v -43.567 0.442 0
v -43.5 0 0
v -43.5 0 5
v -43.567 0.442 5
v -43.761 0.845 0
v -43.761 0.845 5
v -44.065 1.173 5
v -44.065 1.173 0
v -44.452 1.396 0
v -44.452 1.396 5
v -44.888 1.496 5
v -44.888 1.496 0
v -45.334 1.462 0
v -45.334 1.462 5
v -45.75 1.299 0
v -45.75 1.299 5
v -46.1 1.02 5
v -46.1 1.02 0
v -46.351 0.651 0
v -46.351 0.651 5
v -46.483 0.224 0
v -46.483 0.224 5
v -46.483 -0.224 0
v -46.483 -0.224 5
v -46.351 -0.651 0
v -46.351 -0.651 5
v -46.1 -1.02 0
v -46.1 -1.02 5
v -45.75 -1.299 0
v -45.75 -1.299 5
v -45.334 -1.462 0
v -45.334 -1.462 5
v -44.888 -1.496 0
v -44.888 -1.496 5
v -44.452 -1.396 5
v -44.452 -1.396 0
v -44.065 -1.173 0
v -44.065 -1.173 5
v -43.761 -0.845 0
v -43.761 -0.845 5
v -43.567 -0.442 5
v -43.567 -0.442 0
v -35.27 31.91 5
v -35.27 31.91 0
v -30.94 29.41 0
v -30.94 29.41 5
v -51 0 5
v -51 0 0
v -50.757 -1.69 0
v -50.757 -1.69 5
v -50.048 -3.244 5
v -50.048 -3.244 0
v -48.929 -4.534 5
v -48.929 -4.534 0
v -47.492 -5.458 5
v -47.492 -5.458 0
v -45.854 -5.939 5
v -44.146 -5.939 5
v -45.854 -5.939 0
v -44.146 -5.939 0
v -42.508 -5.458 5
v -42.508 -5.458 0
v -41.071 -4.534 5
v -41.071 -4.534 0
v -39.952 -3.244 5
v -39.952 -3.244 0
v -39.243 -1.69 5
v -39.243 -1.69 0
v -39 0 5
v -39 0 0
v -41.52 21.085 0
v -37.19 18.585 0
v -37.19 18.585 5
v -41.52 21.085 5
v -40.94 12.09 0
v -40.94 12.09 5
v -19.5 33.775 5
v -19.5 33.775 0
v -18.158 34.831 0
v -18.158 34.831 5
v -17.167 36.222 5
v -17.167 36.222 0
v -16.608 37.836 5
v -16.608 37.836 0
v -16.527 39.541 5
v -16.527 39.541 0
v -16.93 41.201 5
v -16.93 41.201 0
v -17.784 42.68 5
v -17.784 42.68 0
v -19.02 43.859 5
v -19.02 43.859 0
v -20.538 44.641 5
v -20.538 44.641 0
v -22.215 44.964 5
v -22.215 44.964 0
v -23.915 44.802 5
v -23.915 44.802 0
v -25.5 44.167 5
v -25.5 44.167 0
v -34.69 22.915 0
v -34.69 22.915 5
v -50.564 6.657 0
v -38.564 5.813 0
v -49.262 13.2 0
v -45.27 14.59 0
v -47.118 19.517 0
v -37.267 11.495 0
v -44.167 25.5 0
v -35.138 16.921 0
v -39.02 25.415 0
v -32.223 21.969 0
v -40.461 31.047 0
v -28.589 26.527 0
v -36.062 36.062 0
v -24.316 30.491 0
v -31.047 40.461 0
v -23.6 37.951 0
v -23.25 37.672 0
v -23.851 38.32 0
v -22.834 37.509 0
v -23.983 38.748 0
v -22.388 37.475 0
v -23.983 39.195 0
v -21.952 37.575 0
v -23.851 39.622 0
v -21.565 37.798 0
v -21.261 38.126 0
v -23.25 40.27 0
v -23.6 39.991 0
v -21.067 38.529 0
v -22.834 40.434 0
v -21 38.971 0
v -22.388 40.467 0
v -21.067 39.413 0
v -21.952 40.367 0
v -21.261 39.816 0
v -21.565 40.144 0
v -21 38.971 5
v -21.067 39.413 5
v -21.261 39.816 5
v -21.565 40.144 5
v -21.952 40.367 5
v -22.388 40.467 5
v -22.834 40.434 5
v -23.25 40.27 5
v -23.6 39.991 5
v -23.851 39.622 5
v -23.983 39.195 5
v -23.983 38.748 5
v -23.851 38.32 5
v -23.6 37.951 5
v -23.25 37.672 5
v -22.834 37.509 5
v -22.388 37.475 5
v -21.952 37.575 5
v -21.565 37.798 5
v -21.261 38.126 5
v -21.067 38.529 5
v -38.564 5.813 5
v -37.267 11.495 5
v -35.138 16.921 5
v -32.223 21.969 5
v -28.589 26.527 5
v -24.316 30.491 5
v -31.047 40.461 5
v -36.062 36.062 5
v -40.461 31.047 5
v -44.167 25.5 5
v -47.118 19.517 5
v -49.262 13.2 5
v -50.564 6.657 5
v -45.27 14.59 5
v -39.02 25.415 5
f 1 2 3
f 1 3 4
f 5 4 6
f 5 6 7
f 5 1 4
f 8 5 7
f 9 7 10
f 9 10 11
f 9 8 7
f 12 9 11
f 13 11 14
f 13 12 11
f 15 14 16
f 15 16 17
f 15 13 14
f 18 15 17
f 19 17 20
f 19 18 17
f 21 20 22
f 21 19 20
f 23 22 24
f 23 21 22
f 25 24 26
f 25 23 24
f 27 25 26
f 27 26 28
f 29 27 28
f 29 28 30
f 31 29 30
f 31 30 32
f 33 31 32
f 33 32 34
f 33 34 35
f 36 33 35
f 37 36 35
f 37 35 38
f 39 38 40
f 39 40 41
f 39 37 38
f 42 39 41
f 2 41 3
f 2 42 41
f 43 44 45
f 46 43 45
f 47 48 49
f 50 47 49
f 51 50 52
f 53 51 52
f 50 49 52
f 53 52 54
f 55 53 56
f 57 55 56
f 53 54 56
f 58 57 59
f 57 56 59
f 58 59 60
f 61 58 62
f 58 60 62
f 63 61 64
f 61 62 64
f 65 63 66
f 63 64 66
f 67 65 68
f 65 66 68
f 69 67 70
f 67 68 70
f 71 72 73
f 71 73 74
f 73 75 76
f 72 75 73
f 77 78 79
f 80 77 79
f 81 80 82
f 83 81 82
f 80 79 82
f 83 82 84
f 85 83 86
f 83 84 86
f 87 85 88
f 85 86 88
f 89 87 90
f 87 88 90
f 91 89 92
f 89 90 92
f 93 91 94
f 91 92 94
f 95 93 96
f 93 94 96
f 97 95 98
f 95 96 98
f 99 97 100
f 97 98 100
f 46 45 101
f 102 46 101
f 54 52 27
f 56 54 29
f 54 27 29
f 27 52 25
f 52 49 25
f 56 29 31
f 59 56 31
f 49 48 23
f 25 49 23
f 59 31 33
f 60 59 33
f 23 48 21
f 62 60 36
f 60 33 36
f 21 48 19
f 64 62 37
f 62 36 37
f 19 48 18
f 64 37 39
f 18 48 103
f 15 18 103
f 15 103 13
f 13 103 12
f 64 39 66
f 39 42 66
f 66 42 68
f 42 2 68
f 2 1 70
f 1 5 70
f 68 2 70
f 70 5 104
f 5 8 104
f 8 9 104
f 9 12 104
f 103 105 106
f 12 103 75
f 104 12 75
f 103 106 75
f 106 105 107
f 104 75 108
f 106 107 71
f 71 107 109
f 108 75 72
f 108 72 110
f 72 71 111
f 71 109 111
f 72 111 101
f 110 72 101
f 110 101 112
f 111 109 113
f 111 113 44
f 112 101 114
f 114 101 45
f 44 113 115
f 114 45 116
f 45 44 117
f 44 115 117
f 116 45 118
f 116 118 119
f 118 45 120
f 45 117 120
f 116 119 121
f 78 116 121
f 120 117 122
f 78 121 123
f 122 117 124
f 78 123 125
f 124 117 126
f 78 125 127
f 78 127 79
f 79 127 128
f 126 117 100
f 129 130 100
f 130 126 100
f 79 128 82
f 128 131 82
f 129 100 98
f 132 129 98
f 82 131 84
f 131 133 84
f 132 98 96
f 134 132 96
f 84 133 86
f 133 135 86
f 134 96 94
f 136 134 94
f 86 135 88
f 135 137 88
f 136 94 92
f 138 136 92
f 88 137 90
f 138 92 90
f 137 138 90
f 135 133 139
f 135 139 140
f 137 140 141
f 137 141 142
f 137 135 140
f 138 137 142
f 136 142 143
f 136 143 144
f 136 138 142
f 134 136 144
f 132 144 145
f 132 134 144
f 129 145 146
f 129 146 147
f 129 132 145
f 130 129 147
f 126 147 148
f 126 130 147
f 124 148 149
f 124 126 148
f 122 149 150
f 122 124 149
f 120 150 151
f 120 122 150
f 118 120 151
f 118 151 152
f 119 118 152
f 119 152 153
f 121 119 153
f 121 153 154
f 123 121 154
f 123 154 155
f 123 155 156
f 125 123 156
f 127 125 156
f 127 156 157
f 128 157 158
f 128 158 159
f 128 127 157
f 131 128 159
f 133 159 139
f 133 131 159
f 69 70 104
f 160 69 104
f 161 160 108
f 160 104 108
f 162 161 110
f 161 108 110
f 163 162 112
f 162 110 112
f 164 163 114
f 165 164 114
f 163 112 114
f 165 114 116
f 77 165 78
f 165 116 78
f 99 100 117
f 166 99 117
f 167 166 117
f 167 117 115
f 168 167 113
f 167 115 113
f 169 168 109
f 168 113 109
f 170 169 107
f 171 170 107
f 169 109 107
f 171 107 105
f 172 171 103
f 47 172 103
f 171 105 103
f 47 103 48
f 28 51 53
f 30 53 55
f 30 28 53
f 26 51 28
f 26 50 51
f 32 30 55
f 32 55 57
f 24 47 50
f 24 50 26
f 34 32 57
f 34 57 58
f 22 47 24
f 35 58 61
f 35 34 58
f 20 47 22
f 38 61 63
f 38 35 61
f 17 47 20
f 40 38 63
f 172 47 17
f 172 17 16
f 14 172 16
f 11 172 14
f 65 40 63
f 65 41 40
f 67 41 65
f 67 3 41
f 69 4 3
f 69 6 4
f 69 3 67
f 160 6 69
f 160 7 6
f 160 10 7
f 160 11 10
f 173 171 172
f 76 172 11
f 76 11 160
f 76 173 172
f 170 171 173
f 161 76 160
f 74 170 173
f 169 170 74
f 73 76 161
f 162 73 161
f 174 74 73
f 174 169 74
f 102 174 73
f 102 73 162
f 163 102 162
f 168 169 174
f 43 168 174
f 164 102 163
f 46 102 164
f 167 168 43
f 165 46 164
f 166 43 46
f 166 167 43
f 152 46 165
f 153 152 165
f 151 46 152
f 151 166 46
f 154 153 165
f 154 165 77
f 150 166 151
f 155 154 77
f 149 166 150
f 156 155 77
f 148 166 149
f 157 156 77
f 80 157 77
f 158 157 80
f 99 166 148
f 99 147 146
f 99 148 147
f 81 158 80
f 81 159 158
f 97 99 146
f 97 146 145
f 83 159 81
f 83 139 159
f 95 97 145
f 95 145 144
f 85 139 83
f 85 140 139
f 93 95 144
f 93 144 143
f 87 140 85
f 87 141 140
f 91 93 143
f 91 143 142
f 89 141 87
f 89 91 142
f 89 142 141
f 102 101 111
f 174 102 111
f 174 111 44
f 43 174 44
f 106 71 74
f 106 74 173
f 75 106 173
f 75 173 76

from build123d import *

# Parameters (mm, degrees)
ESQUISSE1_R        = 1.5
BOSS_EXTRU_1_DEPTH = 5


with BuildPart() as part:
    # Esquisse1 → Boss.-Extru.1 (new body)
    with BuildSketch(Plane.XY):
        with BuildLine():
            ThreePointArc((-25.5, 44.167295593), (-44.167295593, 25.5), (-51, 0))
            ThreePointArc((-51, 0), (-45, -6), (-39, 0))
            ThreePointArc((-39, 0), (-33.774990748, 19.5), (-19.5, 33.774990748))
            ThreePointArc((-19.5, 33.774990748), (-17.303847577, 41.97114317), (-25.5, 44.167295593))
        make_face()
        with Locations((-22.5, 38.97114317)):
            Circle(ESQUISSE1_R, mode=Mode.SUBTRACT)
        with Locations((-45, 0)):
            Circle(ESQUISSE1_R, mode=Mode.SUBTRACT)
        Polygon((-30.940054257, 29.410254038), (-34.690054257, 22.915063509), (-39.020181276, 25.415063509), (-35.270181276, 31.910254038), align=None, mode=Mode.SUBTRACT)
        Polygon((-45.270181276, 14.589745962), (-40.940054257, 12.089745962), (-37.190054257, 18.584936491), (-41.520181276, 21.084936491), align=None, mode=Mode.SUBTRACT)
    extrude(amount=BOSS_EXTRU_1_DEPTH)


solid = part.part
